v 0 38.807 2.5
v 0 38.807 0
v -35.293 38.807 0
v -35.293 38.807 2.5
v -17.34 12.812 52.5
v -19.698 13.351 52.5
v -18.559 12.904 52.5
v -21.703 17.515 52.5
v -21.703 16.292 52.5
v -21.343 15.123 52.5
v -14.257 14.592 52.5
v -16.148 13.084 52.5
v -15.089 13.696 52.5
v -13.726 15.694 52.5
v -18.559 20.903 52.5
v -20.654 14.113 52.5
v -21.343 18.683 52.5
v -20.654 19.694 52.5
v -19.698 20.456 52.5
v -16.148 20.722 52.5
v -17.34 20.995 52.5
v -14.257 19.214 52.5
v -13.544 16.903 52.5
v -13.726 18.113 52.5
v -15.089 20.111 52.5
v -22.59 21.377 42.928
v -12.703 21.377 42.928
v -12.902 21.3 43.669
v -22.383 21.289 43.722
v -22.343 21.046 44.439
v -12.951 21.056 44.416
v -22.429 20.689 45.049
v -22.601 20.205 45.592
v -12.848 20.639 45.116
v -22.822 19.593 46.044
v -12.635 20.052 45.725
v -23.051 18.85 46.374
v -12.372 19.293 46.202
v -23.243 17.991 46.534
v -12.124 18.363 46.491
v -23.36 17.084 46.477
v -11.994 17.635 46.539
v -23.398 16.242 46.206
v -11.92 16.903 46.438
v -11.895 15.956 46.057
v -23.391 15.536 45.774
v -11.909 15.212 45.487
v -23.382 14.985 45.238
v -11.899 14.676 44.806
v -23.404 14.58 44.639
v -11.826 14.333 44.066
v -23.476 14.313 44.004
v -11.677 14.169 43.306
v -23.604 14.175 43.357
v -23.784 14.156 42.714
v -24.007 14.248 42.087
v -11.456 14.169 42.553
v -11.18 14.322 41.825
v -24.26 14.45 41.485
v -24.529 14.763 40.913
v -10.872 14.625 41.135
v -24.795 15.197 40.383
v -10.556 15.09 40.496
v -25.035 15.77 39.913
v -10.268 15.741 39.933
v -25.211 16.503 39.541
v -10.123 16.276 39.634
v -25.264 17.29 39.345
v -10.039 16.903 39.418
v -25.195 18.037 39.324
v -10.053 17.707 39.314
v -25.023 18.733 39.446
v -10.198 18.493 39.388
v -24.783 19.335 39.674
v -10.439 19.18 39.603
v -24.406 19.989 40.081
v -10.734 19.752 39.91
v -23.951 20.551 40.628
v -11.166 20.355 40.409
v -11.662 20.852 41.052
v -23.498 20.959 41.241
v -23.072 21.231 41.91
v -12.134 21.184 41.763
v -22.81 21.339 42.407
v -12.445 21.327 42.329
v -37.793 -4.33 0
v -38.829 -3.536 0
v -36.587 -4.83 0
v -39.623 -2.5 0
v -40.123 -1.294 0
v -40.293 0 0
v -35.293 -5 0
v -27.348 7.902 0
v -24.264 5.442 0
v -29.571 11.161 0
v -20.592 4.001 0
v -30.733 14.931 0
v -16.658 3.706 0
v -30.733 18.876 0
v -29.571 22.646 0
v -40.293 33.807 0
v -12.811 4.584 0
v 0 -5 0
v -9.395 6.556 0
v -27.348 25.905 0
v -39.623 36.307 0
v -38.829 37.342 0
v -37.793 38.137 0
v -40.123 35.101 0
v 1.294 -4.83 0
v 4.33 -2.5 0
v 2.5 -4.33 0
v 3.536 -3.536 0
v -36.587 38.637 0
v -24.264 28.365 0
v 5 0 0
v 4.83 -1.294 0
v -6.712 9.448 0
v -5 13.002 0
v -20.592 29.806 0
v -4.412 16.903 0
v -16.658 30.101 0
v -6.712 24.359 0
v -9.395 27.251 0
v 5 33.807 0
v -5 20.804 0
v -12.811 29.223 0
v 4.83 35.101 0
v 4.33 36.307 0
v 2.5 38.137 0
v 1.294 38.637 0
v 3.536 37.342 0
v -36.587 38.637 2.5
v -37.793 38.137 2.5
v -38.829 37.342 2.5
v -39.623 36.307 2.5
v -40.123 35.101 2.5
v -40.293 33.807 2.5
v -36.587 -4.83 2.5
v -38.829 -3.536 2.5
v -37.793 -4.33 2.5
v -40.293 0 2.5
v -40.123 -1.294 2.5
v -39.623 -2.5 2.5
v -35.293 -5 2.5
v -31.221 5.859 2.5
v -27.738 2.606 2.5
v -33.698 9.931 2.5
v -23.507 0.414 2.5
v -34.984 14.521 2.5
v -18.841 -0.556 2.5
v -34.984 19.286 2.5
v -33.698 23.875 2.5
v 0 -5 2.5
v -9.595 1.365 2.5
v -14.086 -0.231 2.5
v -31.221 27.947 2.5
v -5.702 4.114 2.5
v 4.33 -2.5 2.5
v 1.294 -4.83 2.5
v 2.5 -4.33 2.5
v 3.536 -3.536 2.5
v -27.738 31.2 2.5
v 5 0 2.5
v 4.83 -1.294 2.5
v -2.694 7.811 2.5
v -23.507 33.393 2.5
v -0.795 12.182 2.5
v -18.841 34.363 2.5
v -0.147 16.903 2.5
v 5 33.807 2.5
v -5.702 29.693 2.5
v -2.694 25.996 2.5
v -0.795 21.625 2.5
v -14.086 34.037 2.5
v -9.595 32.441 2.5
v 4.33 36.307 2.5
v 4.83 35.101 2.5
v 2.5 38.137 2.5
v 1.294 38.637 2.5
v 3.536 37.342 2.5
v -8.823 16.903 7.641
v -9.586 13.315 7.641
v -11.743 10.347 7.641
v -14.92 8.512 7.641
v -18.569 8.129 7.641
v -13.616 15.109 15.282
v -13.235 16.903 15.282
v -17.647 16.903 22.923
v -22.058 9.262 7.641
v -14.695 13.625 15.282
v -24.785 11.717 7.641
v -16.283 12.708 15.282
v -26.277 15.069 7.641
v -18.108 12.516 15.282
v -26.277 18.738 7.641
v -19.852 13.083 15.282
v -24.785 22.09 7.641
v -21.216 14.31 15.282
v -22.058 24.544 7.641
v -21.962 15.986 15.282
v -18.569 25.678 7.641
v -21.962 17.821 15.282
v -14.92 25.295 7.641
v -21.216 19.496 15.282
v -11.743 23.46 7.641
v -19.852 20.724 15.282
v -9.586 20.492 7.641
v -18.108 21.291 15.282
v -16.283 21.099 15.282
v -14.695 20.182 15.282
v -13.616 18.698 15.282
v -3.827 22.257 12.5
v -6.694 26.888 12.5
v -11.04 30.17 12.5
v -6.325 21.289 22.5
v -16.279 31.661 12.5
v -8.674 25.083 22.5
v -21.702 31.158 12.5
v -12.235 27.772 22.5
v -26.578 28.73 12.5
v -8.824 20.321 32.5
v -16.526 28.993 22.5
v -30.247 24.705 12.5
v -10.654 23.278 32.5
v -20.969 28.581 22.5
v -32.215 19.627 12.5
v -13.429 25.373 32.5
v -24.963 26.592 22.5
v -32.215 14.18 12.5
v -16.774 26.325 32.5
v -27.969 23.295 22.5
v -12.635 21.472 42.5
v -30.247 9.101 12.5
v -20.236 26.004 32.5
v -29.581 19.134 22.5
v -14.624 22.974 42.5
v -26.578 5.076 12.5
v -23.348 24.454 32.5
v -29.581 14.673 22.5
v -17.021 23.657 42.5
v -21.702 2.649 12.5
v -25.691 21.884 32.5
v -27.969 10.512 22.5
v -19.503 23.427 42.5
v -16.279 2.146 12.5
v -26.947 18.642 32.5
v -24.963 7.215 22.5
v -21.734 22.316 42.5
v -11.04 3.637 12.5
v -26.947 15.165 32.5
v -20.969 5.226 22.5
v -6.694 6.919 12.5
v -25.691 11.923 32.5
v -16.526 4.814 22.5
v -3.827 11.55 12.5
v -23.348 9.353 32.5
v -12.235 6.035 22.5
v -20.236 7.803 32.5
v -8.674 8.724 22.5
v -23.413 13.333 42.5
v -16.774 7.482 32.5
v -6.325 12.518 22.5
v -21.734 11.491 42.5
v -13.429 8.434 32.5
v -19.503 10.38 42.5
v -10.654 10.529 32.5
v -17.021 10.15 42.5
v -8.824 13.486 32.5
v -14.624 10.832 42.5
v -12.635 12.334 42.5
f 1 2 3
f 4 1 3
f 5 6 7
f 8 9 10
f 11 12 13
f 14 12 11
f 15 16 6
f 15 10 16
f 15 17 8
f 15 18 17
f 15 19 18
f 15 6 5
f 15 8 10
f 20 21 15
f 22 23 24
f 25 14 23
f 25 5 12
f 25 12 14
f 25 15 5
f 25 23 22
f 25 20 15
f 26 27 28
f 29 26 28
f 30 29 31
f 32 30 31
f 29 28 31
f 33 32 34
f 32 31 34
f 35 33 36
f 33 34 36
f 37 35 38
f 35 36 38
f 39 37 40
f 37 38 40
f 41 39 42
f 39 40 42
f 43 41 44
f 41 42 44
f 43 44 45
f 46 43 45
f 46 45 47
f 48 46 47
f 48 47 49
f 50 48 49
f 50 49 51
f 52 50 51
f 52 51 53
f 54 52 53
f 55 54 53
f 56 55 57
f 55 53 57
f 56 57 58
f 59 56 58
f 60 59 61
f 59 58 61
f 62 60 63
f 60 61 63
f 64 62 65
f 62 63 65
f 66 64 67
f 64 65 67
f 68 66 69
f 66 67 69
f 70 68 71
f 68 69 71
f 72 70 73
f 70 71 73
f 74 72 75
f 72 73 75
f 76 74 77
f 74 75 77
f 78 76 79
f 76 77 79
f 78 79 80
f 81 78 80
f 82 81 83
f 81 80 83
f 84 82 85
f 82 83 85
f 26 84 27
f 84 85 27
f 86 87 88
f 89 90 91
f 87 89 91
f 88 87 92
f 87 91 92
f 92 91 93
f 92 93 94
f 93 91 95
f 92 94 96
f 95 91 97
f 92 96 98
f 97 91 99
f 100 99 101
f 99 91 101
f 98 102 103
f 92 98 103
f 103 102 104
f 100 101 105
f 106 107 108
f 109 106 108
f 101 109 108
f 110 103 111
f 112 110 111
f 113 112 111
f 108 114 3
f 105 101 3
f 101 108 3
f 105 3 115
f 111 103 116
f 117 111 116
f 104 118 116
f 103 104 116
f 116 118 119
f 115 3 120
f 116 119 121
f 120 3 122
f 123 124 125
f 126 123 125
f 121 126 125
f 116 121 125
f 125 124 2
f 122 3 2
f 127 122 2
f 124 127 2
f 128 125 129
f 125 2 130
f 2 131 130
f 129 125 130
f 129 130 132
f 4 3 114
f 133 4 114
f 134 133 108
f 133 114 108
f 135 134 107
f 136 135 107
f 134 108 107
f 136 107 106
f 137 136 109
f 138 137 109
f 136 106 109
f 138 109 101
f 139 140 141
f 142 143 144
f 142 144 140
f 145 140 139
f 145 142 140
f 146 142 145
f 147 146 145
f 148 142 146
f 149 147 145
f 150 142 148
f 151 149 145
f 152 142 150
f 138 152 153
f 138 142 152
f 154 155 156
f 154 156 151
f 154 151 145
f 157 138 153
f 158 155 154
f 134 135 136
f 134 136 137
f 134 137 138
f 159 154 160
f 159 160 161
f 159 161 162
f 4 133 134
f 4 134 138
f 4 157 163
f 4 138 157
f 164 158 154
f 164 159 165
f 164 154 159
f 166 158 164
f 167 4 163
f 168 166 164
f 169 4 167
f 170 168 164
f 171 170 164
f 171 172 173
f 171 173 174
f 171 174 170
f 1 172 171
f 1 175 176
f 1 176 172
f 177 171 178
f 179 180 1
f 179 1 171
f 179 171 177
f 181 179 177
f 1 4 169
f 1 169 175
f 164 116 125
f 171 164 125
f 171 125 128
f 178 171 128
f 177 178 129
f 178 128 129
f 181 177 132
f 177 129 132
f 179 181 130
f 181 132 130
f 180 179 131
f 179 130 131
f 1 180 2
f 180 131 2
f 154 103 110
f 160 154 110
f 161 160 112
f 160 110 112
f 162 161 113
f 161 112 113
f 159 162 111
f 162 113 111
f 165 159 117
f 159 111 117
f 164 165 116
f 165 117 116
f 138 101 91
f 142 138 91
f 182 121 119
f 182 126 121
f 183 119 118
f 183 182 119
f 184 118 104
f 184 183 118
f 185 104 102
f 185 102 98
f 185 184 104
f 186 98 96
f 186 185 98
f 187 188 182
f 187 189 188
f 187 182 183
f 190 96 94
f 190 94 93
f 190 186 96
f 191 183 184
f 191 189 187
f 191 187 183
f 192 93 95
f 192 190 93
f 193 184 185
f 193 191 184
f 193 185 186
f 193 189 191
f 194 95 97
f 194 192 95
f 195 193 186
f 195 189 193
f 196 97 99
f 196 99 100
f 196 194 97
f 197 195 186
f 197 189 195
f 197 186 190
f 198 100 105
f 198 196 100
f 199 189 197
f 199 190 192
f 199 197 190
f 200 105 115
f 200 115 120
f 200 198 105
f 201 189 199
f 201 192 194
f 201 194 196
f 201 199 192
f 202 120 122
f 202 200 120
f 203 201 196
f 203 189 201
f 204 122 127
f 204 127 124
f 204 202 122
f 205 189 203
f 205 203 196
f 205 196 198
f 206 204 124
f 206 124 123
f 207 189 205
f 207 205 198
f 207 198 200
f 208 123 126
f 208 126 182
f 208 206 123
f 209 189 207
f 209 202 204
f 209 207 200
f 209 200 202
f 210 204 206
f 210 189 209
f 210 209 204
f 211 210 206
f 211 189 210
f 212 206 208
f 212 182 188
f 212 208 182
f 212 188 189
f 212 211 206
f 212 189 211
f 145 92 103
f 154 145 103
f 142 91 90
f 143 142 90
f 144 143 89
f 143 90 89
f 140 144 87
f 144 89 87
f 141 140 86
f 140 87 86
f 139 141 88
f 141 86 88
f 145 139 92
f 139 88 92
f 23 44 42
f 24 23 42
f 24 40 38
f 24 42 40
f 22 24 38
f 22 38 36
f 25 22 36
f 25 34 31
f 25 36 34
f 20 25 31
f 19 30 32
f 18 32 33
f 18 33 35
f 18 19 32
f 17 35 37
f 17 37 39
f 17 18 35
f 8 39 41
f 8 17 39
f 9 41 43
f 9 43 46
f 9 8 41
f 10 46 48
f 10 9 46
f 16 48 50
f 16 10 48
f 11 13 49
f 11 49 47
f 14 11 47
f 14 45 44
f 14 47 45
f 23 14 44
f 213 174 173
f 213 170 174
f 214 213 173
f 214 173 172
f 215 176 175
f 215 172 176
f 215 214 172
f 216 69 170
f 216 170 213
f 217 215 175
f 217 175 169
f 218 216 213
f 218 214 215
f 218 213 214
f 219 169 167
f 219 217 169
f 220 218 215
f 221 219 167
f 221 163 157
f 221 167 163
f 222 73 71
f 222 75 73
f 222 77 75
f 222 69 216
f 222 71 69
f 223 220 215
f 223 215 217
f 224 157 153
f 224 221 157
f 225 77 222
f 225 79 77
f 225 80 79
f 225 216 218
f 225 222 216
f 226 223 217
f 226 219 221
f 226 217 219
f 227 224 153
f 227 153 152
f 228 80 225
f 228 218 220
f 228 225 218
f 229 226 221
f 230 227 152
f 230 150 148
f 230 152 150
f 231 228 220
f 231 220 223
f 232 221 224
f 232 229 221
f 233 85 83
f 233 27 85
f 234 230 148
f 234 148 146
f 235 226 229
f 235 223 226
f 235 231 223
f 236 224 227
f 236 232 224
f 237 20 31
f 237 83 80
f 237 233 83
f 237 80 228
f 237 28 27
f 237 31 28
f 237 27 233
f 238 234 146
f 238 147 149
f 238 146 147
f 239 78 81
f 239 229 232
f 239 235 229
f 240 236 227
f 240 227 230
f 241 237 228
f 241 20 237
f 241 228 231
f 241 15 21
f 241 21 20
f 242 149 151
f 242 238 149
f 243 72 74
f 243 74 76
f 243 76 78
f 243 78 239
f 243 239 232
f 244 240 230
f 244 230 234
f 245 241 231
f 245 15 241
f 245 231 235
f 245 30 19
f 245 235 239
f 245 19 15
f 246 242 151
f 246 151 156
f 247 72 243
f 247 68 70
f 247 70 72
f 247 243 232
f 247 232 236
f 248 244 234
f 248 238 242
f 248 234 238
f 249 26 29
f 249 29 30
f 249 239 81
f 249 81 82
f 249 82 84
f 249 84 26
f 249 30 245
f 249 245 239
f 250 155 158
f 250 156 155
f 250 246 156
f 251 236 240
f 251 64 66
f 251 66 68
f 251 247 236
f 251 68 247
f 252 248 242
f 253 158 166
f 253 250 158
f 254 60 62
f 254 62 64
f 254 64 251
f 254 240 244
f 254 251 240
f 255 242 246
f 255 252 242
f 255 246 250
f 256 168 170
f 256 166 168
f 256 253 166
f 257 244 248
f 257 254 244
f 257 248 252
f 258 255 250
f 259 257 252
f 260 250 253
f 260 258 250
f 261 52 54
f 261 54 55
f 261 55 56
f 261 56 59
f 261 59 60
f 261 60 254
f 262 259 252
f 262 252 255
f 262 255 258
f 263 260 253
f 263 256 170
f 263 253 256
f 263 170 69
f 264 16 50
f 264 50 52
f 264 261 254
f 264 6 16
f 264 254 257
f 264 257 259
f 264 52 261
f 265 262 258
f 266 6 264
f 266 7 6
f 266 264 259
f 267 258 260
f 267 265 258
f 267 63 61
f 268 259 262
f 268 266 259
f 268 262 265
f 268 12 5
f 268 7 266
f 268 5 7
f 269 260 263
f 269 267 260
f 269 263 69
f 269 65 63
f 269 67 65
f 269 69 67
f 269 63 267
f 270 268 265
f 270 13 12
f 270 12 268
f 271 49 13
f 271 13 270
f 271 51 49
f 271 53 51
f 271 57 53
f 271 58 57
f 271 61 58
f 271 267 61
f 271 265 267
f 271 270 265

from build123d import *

# Parameters (mm, degrees)
F0_R     = 17.5
F1_DEPTH = 2.5
F2_R     = 17.5
F3_DEPTH = 50
F3_TAPER = 15
F4_R     = 3.6137849114
F5_DEPTH = 60
F6_R     = 13.2346261553


# Not quite as in the source:
# - an extrude whose draft closes it to a point is written as a loft to that point


with BuildPart() as f1:
    # F0 (on Top) → F1 (new body)
    with BuildSketch(Plane.XY):
        with BuildLine():
            Line((0, 38.8068709316), (-35.2930977718, 38.8068709316))
            ThreePointArc((-35.2930977718, 38.8068709316), (-38.8286316778, 37.3424048375), (-40.2930977718, 33.8068709316))
            Line((-40.2930977718, 33.8068709316), (-40.2930977718, 0))
            ThreePointArc((-40.2930977718, 0), (-38.8286316778, -3.5355339059), (-35.2930977718, -5))
            Line((-35.2930977718, -5), (0, -5))
            ThreePointArc((0, -5), (3.5355339059, -3.5355339059), (5, 0))
            Line((5, 0), (5, 33.8068709316))
            ThreePointArc((5, 33.8068709316), (3.5355339059, 37.3424048375), (0, 38.8068709316))
        make_face()
        with Locations((-17.6465488859, 16.9034354658)):
            Circle(F0_R, mode=Mode.SUBTRACT)
        with Locations((-17.6465488859, 16.9034354658)):
            Circle(F0_R)
    extrude(amount=F1_DEPTH)

    # F2 (on face) → F3 (join)
    with BuildSketch(Plane.XY.offset(2.5)):
        with Locations((-17.6465488859, 16.9034354658)):
            Circle(F2_R)
    extrude(amount=F3_DEPTH, taper=F3_TAPER)

    # F4 (on Right) → F5 (cut)
    with BuildSketch(Plane.YZ):
        with Locations((17.7631601691, 42.927633971)):
            Circle(F4_R)
    extrude(amount=-F5_DEPTH, mode=Mode.SUBTRACT)

    # F6 (on face) → F7 section 0
    with BuildSketch(Plane(origin=(0, 0, 0), x_dir=(1, 0, 0), z_dir=(0, 0, -1)), mode=Mode.PRIVATE) as f7_s0:
        with Locations((-17.6465488859, -16.9034354658)):
            Circle(F6_R)
    loft([f7_s0.sketch, Vertex(-17.6465488859, 16.9034354658, 22.9230449201)], ruled=True, mode=Mode.SUBTRACT)


solid = f1.part
